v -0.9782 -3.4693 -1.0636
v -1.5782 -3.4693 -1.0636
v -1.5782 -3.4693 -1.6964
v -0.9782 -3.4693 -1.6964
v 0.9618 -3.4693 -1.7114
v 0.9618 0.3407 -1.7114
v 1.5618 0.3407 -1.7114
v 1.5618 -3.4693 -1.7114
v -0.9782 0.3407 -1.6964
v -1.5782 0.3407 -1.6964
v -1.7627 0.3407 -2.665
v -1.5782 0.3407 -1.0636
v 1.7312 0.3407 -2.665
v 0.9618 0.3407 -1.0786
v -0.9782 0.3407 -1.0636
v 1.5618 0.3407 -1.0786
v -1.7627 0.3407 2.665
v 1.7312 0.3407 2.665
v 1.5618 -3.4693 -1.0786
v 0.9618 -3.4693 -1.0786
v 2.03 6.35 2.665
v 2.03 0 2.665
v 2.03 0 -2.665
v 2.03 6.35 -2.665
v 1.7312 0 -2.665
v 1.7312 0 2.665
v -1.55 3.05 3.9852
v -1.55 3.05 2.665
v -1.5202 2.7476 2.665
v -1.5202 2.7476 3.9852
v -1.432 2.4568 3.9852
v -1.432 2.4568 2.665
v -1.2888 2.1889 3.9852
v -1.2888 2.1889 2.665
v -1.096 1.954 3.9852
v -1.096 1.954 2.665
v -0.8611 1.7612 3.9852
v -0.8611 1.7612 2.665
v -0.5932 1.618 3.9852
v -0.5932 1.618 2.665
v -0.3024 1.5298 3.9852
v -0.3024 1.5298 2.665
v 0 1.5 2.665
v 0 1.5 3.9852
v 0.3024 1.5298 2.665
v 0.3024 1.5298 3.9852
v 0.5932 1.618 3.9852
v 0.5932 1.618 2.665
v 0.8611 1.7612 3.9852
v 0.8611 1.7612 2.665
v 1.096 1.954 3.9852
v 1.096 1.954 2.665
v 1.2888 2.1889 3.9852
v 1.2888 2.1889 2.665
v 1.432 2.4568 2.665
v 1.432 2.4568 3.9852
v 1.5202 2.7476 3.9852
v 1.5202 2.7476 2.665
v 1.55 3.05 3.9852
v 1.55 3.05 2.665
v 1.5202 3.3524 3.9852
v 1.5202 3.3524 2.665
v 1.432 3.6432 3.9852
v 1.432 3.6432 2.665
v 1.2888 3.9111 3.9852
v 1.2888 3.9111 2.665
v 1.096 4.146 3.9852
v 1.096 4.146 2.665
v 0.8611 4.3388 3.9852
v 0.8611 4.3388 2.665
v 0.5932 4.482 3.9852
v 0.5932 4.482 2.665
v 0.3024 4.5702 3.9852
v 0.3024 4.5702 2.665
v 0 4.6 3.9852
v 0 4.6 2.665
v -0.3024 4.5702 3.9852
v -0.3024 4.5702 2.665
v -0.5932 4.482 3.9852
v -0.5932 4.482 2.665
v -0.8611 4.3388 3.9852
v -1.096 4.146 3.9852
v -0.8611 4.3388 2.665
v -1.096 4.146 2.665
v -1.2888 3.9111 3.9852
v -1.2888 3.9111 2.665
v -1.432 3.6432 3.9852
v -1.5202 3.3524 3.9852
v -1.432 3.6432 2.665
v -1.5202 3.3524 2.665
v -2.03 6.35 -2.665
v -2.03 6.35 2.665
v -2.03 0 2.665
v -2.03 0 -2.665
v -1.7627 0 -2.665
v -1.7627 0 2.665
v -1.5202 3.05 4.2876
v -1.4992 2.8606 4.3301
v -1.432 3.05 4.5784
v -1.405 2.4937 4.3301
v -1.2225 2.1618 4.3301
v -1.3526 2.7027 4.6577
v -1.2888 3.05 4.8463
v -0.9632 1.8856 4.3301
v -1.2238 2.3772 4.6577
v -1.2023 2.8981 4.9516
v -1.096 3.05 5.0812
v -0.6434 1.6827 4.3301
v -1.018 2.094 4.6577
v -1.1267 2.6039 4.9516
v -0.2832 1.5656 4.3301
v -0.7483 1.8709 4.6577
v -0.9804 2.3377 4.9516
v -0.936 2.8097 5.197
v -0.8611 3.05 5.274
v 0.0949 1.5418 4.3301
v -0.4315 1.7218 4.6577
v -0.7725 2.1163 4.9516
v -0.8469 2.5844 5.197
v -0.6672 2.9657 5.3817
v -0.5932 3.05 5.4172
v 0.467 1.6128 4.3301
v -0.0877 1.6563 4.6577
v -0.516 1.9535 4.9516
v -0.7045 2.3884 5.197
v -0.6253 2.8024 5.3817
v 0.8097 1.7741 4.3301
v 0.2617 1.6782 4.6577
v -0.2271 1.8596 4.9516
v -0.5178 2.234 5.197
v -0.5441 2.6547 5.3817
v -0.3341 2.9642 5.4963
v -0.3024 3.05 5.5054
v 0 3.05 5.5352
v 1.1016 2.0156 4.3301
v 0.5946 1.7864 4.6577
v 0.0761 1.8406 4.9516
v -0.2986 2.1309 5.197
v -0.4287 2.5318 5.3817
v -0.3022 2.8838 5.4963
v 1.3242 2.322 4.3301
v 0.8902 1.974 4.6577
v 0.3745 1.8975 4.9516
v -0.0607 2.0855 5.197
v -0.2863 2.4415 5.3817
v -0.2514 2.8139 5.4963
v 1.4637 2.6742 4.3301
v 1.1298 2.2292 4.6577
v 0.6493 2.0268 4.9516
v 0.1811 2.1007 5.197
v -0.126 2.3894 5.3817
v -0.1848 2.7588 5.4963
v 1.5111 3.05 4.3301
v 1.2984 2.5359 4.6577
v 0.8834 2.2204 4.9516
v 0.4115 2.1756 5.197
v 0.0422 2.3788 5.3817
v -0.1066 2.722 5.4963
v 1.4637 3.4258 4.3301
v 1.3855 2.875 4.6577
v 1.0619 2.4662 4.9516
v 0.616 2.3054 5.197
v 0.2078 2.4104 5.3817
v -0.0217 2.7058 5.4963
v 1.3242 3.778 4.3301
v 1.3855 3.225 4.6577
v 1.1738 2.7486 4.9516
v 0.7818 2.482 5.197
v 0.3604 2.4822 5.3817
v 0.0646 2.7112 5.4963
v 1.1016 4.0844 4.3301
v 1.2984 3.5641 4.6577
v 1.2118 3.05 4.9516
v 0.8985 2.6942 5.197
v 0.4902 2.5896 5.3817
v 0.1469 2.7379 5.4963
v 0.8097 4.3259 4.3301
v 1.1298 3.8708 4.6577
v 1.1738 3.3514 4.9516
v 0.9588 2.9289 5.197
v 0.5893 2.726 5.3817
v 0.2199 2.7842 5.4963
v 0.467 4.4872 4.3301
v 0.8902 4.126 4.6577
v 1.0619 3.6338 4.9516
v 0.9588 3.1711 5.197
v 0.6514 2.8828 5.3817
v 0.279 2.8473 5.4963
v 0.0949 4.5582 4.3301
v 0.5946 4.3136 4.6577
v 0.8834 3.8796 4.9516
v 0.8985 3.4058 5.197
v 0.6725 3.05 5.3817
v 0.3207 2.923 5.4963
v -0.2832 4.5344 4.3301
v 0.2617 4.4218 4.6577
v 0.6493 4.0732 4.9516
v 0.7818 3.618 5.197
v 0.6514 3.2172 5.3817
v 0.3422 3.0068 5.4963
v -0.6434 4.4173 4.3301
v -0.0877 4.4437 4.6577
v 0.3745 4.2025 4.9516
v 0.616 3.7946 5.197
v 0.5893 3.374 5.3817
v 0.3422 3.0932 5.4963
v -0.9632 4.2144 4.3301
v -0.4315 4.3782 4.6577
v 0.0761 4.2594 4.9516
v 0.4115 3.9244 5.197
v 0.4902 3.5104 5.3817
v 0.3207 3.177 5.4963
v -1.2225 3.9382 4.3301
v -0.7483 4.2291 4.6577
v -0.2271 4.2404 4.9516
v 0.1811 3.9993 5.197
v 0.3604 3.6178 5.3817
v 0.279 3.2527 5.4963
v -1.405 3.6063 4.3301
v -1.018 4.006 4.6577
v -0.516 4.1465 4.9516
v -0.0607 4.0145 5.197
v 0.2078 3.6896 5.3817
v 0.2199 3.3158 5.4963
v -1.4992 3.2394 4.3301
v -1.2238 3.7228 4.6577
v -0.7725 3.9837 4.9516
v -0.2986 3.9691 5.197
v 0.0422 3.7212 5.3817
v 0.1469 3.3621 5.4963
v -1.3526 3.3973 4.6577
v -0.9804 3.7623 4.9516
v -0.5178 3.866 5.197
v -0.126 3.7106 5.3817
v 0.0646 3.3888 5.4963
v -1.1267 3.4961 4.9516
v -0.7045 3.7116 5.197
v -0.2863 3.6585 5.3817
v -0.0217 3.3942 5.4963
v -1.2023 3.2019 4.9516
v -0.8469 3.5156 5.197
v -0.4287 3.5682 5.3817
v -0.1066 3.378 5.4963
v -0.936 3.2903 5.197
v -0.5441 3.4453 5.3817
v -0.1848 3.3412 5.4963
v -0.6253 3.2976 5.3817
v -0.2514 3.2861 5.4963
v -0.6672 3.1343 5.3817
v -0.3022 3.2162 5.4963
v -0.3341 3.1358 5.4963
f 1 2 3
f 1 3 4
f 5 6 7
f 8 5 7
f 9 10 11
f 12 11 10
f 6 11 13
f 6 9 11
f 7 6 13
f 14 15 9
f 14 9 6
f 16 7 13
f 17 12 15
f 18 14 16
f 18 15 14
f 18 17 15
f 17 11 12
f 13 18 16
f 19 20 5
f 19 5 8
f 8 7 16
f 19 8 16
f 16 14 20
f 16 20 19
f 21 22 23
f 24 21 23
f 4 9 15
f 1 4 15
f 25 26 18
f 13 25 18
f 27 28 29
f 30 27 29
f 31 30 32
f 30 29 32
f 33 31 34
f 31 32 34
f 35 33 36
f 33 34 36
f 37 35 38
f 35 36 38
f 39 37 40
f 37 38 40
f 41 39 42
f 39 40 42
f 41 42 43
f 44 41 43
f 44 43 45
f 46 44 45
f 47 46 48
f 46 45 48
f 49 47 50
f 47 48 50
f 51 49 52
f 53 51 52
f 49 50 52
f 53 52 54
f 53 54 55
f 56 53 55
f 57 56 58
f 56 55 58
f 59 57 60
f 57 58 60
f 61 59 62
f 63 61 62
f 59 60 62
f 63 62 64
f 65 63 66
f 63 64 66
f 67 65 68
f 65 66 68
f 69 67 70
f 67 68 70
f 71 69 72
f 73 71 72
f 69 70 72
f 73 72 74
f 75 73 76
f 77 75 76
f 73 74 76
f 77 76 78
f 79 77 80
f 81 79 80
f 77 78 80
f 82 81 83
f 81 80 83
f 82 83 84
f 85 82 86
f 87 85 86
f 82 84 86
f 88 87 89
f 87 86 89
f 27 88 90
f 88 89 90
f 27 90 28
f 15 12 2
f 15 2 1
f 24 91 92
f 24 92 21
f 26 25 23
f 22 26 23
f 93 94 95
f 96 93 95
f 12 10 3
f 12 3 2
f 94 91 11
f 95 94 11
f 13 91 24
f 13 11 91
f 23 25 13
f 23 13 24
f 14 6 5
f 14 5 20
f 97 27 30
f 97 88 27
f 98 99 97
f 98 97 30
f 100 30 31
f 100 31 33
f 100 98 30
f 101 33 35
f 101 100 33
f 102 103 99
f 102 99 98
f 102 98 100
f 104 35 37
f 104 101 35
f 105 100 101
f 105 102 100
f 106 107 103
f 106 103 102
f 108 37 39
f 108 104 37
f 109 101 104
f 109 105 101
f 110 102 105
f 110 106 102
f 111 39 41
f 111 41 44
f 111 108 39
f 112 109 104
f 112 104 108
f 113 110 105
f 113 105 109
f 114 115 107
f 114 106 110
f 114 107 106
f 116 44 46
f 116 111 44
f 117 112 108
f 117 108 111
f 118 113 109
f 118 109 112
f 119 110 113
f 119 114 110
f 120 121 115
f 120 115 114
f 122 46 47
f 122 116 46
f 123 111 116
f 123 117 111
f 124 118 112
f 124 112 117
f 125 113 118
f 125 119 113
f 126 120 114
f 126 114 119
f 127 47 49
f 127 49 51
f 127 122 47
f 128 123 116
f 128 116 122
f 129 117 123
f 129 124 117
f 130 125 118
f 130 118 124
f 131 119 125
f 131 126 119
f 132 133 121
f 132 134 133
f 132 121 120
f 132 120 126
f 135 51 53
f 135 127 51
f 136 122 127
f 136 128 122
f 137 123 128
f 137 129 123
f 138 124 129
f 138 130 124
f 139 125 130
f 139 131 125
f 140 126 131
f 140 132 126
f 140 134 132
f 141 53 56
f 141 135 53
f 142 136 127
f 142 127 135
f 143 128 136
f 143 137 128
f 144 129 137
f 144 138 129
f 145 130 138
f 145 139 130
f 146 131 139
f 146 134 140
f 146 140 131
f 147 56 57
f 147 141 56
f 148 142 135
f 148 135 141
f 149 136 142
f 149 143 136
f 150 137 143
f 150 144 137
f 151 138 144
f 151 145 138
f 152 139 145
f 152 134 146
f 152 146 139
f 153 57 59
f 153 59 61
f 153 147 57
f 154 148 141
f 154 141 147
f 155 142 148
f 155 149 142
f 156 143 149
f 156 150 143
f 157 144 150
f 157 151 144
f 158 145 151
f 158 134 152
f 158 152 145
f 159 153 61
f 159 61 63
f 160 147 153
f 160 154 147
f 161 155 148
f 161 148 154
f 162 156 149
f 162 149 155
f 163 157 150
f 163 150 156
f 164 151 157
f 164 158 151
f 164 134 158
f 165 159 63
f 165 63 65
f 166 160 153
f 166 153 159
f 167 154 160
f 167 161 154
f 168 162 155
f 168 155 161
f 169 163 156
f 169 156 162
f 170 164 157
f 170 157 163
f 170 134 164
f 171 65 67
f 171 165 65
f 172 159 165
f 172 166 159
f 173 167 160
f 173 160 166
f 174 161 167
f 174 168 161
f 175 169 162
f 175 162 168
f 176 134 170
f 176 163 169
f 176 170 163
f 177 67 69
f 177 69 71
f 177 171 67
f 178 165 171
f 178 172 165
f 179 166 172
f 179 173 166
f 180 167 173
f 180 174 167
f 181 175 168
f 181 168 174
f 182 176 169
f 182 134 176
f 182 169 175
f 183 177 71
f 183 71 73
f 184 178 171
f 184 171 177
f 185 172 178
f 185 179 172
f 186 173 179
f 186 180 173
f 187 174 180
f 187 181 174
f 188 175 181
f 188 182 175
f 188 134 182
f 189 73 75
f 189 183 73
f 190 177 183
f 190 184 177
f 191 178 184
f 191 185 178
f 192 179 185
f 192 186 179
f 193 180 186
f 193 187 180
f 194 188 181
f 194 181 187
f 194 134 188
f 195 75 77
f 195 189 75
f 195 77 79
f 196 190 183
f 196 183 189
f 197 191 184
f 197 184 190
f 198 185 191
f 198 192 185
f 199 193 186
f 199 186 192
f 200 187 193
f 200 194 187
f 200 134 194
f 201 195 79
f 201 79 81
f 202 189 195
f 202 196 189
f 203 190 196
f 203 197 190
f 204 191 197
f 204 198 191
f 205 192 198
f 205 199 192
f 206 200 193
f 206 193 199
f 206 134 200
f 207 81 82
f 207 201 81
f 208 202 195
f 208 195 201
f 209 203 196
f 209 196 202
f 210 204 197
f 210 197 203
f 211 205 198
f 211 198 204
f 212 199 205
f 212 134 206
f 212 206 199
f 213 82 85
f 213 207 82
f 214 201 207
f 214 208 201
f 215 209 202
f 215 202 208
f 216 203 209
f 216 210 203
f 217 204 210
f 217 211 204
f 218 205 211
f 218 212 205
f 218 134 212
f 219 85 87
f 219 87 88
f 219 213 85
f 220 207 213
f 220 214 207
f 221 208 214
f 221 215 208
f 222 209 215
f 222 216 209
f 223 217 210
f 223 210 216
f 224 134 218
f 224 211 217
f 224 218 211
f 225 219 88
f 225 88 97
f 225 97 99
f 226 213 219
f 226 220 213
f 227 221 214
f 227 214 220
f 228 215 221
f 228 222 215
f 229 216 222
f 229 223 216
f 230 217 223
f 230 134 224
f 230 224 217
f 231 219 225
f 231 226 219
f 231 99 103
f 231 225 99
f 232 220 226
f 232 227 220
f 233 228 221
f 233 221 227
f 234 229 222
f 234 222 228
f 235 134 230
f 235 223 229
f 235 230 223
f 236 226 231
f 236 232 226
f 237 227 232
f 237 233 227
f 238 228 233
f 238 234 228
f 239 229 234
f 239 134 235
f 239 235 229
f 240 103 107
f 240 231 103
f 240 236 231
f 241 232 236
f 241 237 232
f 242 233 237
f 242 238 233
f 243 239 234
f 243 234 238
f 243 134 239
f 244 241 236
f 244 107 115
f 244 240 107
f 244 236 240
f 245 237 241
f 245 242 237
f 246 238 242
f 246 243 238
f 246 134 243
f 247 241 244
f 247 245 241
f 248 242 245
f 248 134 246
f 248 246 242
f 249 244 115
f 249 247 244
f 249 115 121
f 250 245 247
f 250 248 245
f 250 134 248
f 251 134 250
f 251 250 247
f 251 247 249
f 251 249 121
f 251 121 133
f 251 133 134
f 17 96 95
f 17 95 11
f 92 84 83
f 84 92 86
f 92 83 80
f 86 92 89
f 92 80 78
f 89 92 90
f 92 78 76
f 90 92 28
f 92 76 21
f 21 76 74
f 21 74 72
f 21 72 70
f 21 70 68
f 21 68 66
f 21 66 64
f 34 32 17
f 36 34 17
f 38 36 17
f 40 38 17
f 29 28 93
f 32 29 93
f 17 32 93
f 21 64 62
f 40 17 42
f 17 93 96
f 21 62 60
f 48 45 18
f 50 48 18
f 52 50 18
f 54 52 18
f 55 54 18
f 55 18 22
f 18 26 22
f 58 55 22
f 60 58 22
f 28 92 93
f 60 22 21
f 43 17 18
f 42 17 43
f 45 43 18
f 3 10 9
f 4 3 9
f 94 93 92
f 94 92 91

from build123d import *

# Parameters (mm, degrees)
SKETCH1_W           = 4.06
SKETCH1_H           = 5.33
BOSS_EXTRUDE1_DEPTH = 6.35
SKETCH2_R           = 1.55
BOSS_EXTRUDE2_DEPTH = 2.8702
FILLET2_R           = 1.55
SKETCH4_W           = 3.493828458
SKETCH4_H           = 0.340679683
CUT_EXTRUDE1_DEPTH  = 9.53535588
SKETCH6_W           = 0.6
SKETCH6_H           = 0.632779055
SKETCH6_H_2         = 0.632779056
BOSS_EXTRUDE5_DEPTH = 3.81


with BuildPart() as part:
    # Sketch1 → Boss-Extrude1 (new body)
    with BuildSketch(Plane(origin=(0, 0, 0), x_dir=(1, 0, 0), z_dir=(0, 1, 0))):
        Rectangle(SKETCH1_W, SKETCH1_H)
    extrude(amount=BOSS_EXTRUDE1_DEPTH)

    # Sketch2 → Boss-Extrude2 (add)
    with BuildSketch(Plane.XY.offset(2.665)):
        with Locations(Location((0, 3.05, 0), (0, 0, 180))):
            Circle(SKETCH2_R)
    extrude(amount=BOSS_EXTRUDE2_DEPTH)

    # Fillet2
    fillet2_edges = [part.edges().sort_by_distance(p)[0] for p in [
        (1.55, 3.05, 5.5352),
    ]]
    fillet(fillet2_edges, radius=FILLET2_R)

    # Sketch4 → Cut-Extrude1 (cut, through all)
    with BuildSketch(Plane.XY.offset(2.665)):
        with Locations((-0.015737966, 0.170339842)):
            Rectangle(SKETCH4_W, SKETCH4_H)
    extrude(amount=-CUT_EXTRUDE1_DEPTH, mode=Mode.SUBTRACT)

    # Sketch6 → Boss-Extrude5 (add)
    with BuildSketch(Plane.XZ.offset(-0.340679683)):
        with Locations((-1.278193782, -1.380000213)):
            Rectangle(SKETCH6_W, SKETCH6_H)
        with Locations((1.261806218, -1.395)):
            Rectangle(SKETCH6_W, SKETCH6_H_2)
    extrude(amount=BOSS_EXTRUDE5_DEPTH)


solid = part.part
